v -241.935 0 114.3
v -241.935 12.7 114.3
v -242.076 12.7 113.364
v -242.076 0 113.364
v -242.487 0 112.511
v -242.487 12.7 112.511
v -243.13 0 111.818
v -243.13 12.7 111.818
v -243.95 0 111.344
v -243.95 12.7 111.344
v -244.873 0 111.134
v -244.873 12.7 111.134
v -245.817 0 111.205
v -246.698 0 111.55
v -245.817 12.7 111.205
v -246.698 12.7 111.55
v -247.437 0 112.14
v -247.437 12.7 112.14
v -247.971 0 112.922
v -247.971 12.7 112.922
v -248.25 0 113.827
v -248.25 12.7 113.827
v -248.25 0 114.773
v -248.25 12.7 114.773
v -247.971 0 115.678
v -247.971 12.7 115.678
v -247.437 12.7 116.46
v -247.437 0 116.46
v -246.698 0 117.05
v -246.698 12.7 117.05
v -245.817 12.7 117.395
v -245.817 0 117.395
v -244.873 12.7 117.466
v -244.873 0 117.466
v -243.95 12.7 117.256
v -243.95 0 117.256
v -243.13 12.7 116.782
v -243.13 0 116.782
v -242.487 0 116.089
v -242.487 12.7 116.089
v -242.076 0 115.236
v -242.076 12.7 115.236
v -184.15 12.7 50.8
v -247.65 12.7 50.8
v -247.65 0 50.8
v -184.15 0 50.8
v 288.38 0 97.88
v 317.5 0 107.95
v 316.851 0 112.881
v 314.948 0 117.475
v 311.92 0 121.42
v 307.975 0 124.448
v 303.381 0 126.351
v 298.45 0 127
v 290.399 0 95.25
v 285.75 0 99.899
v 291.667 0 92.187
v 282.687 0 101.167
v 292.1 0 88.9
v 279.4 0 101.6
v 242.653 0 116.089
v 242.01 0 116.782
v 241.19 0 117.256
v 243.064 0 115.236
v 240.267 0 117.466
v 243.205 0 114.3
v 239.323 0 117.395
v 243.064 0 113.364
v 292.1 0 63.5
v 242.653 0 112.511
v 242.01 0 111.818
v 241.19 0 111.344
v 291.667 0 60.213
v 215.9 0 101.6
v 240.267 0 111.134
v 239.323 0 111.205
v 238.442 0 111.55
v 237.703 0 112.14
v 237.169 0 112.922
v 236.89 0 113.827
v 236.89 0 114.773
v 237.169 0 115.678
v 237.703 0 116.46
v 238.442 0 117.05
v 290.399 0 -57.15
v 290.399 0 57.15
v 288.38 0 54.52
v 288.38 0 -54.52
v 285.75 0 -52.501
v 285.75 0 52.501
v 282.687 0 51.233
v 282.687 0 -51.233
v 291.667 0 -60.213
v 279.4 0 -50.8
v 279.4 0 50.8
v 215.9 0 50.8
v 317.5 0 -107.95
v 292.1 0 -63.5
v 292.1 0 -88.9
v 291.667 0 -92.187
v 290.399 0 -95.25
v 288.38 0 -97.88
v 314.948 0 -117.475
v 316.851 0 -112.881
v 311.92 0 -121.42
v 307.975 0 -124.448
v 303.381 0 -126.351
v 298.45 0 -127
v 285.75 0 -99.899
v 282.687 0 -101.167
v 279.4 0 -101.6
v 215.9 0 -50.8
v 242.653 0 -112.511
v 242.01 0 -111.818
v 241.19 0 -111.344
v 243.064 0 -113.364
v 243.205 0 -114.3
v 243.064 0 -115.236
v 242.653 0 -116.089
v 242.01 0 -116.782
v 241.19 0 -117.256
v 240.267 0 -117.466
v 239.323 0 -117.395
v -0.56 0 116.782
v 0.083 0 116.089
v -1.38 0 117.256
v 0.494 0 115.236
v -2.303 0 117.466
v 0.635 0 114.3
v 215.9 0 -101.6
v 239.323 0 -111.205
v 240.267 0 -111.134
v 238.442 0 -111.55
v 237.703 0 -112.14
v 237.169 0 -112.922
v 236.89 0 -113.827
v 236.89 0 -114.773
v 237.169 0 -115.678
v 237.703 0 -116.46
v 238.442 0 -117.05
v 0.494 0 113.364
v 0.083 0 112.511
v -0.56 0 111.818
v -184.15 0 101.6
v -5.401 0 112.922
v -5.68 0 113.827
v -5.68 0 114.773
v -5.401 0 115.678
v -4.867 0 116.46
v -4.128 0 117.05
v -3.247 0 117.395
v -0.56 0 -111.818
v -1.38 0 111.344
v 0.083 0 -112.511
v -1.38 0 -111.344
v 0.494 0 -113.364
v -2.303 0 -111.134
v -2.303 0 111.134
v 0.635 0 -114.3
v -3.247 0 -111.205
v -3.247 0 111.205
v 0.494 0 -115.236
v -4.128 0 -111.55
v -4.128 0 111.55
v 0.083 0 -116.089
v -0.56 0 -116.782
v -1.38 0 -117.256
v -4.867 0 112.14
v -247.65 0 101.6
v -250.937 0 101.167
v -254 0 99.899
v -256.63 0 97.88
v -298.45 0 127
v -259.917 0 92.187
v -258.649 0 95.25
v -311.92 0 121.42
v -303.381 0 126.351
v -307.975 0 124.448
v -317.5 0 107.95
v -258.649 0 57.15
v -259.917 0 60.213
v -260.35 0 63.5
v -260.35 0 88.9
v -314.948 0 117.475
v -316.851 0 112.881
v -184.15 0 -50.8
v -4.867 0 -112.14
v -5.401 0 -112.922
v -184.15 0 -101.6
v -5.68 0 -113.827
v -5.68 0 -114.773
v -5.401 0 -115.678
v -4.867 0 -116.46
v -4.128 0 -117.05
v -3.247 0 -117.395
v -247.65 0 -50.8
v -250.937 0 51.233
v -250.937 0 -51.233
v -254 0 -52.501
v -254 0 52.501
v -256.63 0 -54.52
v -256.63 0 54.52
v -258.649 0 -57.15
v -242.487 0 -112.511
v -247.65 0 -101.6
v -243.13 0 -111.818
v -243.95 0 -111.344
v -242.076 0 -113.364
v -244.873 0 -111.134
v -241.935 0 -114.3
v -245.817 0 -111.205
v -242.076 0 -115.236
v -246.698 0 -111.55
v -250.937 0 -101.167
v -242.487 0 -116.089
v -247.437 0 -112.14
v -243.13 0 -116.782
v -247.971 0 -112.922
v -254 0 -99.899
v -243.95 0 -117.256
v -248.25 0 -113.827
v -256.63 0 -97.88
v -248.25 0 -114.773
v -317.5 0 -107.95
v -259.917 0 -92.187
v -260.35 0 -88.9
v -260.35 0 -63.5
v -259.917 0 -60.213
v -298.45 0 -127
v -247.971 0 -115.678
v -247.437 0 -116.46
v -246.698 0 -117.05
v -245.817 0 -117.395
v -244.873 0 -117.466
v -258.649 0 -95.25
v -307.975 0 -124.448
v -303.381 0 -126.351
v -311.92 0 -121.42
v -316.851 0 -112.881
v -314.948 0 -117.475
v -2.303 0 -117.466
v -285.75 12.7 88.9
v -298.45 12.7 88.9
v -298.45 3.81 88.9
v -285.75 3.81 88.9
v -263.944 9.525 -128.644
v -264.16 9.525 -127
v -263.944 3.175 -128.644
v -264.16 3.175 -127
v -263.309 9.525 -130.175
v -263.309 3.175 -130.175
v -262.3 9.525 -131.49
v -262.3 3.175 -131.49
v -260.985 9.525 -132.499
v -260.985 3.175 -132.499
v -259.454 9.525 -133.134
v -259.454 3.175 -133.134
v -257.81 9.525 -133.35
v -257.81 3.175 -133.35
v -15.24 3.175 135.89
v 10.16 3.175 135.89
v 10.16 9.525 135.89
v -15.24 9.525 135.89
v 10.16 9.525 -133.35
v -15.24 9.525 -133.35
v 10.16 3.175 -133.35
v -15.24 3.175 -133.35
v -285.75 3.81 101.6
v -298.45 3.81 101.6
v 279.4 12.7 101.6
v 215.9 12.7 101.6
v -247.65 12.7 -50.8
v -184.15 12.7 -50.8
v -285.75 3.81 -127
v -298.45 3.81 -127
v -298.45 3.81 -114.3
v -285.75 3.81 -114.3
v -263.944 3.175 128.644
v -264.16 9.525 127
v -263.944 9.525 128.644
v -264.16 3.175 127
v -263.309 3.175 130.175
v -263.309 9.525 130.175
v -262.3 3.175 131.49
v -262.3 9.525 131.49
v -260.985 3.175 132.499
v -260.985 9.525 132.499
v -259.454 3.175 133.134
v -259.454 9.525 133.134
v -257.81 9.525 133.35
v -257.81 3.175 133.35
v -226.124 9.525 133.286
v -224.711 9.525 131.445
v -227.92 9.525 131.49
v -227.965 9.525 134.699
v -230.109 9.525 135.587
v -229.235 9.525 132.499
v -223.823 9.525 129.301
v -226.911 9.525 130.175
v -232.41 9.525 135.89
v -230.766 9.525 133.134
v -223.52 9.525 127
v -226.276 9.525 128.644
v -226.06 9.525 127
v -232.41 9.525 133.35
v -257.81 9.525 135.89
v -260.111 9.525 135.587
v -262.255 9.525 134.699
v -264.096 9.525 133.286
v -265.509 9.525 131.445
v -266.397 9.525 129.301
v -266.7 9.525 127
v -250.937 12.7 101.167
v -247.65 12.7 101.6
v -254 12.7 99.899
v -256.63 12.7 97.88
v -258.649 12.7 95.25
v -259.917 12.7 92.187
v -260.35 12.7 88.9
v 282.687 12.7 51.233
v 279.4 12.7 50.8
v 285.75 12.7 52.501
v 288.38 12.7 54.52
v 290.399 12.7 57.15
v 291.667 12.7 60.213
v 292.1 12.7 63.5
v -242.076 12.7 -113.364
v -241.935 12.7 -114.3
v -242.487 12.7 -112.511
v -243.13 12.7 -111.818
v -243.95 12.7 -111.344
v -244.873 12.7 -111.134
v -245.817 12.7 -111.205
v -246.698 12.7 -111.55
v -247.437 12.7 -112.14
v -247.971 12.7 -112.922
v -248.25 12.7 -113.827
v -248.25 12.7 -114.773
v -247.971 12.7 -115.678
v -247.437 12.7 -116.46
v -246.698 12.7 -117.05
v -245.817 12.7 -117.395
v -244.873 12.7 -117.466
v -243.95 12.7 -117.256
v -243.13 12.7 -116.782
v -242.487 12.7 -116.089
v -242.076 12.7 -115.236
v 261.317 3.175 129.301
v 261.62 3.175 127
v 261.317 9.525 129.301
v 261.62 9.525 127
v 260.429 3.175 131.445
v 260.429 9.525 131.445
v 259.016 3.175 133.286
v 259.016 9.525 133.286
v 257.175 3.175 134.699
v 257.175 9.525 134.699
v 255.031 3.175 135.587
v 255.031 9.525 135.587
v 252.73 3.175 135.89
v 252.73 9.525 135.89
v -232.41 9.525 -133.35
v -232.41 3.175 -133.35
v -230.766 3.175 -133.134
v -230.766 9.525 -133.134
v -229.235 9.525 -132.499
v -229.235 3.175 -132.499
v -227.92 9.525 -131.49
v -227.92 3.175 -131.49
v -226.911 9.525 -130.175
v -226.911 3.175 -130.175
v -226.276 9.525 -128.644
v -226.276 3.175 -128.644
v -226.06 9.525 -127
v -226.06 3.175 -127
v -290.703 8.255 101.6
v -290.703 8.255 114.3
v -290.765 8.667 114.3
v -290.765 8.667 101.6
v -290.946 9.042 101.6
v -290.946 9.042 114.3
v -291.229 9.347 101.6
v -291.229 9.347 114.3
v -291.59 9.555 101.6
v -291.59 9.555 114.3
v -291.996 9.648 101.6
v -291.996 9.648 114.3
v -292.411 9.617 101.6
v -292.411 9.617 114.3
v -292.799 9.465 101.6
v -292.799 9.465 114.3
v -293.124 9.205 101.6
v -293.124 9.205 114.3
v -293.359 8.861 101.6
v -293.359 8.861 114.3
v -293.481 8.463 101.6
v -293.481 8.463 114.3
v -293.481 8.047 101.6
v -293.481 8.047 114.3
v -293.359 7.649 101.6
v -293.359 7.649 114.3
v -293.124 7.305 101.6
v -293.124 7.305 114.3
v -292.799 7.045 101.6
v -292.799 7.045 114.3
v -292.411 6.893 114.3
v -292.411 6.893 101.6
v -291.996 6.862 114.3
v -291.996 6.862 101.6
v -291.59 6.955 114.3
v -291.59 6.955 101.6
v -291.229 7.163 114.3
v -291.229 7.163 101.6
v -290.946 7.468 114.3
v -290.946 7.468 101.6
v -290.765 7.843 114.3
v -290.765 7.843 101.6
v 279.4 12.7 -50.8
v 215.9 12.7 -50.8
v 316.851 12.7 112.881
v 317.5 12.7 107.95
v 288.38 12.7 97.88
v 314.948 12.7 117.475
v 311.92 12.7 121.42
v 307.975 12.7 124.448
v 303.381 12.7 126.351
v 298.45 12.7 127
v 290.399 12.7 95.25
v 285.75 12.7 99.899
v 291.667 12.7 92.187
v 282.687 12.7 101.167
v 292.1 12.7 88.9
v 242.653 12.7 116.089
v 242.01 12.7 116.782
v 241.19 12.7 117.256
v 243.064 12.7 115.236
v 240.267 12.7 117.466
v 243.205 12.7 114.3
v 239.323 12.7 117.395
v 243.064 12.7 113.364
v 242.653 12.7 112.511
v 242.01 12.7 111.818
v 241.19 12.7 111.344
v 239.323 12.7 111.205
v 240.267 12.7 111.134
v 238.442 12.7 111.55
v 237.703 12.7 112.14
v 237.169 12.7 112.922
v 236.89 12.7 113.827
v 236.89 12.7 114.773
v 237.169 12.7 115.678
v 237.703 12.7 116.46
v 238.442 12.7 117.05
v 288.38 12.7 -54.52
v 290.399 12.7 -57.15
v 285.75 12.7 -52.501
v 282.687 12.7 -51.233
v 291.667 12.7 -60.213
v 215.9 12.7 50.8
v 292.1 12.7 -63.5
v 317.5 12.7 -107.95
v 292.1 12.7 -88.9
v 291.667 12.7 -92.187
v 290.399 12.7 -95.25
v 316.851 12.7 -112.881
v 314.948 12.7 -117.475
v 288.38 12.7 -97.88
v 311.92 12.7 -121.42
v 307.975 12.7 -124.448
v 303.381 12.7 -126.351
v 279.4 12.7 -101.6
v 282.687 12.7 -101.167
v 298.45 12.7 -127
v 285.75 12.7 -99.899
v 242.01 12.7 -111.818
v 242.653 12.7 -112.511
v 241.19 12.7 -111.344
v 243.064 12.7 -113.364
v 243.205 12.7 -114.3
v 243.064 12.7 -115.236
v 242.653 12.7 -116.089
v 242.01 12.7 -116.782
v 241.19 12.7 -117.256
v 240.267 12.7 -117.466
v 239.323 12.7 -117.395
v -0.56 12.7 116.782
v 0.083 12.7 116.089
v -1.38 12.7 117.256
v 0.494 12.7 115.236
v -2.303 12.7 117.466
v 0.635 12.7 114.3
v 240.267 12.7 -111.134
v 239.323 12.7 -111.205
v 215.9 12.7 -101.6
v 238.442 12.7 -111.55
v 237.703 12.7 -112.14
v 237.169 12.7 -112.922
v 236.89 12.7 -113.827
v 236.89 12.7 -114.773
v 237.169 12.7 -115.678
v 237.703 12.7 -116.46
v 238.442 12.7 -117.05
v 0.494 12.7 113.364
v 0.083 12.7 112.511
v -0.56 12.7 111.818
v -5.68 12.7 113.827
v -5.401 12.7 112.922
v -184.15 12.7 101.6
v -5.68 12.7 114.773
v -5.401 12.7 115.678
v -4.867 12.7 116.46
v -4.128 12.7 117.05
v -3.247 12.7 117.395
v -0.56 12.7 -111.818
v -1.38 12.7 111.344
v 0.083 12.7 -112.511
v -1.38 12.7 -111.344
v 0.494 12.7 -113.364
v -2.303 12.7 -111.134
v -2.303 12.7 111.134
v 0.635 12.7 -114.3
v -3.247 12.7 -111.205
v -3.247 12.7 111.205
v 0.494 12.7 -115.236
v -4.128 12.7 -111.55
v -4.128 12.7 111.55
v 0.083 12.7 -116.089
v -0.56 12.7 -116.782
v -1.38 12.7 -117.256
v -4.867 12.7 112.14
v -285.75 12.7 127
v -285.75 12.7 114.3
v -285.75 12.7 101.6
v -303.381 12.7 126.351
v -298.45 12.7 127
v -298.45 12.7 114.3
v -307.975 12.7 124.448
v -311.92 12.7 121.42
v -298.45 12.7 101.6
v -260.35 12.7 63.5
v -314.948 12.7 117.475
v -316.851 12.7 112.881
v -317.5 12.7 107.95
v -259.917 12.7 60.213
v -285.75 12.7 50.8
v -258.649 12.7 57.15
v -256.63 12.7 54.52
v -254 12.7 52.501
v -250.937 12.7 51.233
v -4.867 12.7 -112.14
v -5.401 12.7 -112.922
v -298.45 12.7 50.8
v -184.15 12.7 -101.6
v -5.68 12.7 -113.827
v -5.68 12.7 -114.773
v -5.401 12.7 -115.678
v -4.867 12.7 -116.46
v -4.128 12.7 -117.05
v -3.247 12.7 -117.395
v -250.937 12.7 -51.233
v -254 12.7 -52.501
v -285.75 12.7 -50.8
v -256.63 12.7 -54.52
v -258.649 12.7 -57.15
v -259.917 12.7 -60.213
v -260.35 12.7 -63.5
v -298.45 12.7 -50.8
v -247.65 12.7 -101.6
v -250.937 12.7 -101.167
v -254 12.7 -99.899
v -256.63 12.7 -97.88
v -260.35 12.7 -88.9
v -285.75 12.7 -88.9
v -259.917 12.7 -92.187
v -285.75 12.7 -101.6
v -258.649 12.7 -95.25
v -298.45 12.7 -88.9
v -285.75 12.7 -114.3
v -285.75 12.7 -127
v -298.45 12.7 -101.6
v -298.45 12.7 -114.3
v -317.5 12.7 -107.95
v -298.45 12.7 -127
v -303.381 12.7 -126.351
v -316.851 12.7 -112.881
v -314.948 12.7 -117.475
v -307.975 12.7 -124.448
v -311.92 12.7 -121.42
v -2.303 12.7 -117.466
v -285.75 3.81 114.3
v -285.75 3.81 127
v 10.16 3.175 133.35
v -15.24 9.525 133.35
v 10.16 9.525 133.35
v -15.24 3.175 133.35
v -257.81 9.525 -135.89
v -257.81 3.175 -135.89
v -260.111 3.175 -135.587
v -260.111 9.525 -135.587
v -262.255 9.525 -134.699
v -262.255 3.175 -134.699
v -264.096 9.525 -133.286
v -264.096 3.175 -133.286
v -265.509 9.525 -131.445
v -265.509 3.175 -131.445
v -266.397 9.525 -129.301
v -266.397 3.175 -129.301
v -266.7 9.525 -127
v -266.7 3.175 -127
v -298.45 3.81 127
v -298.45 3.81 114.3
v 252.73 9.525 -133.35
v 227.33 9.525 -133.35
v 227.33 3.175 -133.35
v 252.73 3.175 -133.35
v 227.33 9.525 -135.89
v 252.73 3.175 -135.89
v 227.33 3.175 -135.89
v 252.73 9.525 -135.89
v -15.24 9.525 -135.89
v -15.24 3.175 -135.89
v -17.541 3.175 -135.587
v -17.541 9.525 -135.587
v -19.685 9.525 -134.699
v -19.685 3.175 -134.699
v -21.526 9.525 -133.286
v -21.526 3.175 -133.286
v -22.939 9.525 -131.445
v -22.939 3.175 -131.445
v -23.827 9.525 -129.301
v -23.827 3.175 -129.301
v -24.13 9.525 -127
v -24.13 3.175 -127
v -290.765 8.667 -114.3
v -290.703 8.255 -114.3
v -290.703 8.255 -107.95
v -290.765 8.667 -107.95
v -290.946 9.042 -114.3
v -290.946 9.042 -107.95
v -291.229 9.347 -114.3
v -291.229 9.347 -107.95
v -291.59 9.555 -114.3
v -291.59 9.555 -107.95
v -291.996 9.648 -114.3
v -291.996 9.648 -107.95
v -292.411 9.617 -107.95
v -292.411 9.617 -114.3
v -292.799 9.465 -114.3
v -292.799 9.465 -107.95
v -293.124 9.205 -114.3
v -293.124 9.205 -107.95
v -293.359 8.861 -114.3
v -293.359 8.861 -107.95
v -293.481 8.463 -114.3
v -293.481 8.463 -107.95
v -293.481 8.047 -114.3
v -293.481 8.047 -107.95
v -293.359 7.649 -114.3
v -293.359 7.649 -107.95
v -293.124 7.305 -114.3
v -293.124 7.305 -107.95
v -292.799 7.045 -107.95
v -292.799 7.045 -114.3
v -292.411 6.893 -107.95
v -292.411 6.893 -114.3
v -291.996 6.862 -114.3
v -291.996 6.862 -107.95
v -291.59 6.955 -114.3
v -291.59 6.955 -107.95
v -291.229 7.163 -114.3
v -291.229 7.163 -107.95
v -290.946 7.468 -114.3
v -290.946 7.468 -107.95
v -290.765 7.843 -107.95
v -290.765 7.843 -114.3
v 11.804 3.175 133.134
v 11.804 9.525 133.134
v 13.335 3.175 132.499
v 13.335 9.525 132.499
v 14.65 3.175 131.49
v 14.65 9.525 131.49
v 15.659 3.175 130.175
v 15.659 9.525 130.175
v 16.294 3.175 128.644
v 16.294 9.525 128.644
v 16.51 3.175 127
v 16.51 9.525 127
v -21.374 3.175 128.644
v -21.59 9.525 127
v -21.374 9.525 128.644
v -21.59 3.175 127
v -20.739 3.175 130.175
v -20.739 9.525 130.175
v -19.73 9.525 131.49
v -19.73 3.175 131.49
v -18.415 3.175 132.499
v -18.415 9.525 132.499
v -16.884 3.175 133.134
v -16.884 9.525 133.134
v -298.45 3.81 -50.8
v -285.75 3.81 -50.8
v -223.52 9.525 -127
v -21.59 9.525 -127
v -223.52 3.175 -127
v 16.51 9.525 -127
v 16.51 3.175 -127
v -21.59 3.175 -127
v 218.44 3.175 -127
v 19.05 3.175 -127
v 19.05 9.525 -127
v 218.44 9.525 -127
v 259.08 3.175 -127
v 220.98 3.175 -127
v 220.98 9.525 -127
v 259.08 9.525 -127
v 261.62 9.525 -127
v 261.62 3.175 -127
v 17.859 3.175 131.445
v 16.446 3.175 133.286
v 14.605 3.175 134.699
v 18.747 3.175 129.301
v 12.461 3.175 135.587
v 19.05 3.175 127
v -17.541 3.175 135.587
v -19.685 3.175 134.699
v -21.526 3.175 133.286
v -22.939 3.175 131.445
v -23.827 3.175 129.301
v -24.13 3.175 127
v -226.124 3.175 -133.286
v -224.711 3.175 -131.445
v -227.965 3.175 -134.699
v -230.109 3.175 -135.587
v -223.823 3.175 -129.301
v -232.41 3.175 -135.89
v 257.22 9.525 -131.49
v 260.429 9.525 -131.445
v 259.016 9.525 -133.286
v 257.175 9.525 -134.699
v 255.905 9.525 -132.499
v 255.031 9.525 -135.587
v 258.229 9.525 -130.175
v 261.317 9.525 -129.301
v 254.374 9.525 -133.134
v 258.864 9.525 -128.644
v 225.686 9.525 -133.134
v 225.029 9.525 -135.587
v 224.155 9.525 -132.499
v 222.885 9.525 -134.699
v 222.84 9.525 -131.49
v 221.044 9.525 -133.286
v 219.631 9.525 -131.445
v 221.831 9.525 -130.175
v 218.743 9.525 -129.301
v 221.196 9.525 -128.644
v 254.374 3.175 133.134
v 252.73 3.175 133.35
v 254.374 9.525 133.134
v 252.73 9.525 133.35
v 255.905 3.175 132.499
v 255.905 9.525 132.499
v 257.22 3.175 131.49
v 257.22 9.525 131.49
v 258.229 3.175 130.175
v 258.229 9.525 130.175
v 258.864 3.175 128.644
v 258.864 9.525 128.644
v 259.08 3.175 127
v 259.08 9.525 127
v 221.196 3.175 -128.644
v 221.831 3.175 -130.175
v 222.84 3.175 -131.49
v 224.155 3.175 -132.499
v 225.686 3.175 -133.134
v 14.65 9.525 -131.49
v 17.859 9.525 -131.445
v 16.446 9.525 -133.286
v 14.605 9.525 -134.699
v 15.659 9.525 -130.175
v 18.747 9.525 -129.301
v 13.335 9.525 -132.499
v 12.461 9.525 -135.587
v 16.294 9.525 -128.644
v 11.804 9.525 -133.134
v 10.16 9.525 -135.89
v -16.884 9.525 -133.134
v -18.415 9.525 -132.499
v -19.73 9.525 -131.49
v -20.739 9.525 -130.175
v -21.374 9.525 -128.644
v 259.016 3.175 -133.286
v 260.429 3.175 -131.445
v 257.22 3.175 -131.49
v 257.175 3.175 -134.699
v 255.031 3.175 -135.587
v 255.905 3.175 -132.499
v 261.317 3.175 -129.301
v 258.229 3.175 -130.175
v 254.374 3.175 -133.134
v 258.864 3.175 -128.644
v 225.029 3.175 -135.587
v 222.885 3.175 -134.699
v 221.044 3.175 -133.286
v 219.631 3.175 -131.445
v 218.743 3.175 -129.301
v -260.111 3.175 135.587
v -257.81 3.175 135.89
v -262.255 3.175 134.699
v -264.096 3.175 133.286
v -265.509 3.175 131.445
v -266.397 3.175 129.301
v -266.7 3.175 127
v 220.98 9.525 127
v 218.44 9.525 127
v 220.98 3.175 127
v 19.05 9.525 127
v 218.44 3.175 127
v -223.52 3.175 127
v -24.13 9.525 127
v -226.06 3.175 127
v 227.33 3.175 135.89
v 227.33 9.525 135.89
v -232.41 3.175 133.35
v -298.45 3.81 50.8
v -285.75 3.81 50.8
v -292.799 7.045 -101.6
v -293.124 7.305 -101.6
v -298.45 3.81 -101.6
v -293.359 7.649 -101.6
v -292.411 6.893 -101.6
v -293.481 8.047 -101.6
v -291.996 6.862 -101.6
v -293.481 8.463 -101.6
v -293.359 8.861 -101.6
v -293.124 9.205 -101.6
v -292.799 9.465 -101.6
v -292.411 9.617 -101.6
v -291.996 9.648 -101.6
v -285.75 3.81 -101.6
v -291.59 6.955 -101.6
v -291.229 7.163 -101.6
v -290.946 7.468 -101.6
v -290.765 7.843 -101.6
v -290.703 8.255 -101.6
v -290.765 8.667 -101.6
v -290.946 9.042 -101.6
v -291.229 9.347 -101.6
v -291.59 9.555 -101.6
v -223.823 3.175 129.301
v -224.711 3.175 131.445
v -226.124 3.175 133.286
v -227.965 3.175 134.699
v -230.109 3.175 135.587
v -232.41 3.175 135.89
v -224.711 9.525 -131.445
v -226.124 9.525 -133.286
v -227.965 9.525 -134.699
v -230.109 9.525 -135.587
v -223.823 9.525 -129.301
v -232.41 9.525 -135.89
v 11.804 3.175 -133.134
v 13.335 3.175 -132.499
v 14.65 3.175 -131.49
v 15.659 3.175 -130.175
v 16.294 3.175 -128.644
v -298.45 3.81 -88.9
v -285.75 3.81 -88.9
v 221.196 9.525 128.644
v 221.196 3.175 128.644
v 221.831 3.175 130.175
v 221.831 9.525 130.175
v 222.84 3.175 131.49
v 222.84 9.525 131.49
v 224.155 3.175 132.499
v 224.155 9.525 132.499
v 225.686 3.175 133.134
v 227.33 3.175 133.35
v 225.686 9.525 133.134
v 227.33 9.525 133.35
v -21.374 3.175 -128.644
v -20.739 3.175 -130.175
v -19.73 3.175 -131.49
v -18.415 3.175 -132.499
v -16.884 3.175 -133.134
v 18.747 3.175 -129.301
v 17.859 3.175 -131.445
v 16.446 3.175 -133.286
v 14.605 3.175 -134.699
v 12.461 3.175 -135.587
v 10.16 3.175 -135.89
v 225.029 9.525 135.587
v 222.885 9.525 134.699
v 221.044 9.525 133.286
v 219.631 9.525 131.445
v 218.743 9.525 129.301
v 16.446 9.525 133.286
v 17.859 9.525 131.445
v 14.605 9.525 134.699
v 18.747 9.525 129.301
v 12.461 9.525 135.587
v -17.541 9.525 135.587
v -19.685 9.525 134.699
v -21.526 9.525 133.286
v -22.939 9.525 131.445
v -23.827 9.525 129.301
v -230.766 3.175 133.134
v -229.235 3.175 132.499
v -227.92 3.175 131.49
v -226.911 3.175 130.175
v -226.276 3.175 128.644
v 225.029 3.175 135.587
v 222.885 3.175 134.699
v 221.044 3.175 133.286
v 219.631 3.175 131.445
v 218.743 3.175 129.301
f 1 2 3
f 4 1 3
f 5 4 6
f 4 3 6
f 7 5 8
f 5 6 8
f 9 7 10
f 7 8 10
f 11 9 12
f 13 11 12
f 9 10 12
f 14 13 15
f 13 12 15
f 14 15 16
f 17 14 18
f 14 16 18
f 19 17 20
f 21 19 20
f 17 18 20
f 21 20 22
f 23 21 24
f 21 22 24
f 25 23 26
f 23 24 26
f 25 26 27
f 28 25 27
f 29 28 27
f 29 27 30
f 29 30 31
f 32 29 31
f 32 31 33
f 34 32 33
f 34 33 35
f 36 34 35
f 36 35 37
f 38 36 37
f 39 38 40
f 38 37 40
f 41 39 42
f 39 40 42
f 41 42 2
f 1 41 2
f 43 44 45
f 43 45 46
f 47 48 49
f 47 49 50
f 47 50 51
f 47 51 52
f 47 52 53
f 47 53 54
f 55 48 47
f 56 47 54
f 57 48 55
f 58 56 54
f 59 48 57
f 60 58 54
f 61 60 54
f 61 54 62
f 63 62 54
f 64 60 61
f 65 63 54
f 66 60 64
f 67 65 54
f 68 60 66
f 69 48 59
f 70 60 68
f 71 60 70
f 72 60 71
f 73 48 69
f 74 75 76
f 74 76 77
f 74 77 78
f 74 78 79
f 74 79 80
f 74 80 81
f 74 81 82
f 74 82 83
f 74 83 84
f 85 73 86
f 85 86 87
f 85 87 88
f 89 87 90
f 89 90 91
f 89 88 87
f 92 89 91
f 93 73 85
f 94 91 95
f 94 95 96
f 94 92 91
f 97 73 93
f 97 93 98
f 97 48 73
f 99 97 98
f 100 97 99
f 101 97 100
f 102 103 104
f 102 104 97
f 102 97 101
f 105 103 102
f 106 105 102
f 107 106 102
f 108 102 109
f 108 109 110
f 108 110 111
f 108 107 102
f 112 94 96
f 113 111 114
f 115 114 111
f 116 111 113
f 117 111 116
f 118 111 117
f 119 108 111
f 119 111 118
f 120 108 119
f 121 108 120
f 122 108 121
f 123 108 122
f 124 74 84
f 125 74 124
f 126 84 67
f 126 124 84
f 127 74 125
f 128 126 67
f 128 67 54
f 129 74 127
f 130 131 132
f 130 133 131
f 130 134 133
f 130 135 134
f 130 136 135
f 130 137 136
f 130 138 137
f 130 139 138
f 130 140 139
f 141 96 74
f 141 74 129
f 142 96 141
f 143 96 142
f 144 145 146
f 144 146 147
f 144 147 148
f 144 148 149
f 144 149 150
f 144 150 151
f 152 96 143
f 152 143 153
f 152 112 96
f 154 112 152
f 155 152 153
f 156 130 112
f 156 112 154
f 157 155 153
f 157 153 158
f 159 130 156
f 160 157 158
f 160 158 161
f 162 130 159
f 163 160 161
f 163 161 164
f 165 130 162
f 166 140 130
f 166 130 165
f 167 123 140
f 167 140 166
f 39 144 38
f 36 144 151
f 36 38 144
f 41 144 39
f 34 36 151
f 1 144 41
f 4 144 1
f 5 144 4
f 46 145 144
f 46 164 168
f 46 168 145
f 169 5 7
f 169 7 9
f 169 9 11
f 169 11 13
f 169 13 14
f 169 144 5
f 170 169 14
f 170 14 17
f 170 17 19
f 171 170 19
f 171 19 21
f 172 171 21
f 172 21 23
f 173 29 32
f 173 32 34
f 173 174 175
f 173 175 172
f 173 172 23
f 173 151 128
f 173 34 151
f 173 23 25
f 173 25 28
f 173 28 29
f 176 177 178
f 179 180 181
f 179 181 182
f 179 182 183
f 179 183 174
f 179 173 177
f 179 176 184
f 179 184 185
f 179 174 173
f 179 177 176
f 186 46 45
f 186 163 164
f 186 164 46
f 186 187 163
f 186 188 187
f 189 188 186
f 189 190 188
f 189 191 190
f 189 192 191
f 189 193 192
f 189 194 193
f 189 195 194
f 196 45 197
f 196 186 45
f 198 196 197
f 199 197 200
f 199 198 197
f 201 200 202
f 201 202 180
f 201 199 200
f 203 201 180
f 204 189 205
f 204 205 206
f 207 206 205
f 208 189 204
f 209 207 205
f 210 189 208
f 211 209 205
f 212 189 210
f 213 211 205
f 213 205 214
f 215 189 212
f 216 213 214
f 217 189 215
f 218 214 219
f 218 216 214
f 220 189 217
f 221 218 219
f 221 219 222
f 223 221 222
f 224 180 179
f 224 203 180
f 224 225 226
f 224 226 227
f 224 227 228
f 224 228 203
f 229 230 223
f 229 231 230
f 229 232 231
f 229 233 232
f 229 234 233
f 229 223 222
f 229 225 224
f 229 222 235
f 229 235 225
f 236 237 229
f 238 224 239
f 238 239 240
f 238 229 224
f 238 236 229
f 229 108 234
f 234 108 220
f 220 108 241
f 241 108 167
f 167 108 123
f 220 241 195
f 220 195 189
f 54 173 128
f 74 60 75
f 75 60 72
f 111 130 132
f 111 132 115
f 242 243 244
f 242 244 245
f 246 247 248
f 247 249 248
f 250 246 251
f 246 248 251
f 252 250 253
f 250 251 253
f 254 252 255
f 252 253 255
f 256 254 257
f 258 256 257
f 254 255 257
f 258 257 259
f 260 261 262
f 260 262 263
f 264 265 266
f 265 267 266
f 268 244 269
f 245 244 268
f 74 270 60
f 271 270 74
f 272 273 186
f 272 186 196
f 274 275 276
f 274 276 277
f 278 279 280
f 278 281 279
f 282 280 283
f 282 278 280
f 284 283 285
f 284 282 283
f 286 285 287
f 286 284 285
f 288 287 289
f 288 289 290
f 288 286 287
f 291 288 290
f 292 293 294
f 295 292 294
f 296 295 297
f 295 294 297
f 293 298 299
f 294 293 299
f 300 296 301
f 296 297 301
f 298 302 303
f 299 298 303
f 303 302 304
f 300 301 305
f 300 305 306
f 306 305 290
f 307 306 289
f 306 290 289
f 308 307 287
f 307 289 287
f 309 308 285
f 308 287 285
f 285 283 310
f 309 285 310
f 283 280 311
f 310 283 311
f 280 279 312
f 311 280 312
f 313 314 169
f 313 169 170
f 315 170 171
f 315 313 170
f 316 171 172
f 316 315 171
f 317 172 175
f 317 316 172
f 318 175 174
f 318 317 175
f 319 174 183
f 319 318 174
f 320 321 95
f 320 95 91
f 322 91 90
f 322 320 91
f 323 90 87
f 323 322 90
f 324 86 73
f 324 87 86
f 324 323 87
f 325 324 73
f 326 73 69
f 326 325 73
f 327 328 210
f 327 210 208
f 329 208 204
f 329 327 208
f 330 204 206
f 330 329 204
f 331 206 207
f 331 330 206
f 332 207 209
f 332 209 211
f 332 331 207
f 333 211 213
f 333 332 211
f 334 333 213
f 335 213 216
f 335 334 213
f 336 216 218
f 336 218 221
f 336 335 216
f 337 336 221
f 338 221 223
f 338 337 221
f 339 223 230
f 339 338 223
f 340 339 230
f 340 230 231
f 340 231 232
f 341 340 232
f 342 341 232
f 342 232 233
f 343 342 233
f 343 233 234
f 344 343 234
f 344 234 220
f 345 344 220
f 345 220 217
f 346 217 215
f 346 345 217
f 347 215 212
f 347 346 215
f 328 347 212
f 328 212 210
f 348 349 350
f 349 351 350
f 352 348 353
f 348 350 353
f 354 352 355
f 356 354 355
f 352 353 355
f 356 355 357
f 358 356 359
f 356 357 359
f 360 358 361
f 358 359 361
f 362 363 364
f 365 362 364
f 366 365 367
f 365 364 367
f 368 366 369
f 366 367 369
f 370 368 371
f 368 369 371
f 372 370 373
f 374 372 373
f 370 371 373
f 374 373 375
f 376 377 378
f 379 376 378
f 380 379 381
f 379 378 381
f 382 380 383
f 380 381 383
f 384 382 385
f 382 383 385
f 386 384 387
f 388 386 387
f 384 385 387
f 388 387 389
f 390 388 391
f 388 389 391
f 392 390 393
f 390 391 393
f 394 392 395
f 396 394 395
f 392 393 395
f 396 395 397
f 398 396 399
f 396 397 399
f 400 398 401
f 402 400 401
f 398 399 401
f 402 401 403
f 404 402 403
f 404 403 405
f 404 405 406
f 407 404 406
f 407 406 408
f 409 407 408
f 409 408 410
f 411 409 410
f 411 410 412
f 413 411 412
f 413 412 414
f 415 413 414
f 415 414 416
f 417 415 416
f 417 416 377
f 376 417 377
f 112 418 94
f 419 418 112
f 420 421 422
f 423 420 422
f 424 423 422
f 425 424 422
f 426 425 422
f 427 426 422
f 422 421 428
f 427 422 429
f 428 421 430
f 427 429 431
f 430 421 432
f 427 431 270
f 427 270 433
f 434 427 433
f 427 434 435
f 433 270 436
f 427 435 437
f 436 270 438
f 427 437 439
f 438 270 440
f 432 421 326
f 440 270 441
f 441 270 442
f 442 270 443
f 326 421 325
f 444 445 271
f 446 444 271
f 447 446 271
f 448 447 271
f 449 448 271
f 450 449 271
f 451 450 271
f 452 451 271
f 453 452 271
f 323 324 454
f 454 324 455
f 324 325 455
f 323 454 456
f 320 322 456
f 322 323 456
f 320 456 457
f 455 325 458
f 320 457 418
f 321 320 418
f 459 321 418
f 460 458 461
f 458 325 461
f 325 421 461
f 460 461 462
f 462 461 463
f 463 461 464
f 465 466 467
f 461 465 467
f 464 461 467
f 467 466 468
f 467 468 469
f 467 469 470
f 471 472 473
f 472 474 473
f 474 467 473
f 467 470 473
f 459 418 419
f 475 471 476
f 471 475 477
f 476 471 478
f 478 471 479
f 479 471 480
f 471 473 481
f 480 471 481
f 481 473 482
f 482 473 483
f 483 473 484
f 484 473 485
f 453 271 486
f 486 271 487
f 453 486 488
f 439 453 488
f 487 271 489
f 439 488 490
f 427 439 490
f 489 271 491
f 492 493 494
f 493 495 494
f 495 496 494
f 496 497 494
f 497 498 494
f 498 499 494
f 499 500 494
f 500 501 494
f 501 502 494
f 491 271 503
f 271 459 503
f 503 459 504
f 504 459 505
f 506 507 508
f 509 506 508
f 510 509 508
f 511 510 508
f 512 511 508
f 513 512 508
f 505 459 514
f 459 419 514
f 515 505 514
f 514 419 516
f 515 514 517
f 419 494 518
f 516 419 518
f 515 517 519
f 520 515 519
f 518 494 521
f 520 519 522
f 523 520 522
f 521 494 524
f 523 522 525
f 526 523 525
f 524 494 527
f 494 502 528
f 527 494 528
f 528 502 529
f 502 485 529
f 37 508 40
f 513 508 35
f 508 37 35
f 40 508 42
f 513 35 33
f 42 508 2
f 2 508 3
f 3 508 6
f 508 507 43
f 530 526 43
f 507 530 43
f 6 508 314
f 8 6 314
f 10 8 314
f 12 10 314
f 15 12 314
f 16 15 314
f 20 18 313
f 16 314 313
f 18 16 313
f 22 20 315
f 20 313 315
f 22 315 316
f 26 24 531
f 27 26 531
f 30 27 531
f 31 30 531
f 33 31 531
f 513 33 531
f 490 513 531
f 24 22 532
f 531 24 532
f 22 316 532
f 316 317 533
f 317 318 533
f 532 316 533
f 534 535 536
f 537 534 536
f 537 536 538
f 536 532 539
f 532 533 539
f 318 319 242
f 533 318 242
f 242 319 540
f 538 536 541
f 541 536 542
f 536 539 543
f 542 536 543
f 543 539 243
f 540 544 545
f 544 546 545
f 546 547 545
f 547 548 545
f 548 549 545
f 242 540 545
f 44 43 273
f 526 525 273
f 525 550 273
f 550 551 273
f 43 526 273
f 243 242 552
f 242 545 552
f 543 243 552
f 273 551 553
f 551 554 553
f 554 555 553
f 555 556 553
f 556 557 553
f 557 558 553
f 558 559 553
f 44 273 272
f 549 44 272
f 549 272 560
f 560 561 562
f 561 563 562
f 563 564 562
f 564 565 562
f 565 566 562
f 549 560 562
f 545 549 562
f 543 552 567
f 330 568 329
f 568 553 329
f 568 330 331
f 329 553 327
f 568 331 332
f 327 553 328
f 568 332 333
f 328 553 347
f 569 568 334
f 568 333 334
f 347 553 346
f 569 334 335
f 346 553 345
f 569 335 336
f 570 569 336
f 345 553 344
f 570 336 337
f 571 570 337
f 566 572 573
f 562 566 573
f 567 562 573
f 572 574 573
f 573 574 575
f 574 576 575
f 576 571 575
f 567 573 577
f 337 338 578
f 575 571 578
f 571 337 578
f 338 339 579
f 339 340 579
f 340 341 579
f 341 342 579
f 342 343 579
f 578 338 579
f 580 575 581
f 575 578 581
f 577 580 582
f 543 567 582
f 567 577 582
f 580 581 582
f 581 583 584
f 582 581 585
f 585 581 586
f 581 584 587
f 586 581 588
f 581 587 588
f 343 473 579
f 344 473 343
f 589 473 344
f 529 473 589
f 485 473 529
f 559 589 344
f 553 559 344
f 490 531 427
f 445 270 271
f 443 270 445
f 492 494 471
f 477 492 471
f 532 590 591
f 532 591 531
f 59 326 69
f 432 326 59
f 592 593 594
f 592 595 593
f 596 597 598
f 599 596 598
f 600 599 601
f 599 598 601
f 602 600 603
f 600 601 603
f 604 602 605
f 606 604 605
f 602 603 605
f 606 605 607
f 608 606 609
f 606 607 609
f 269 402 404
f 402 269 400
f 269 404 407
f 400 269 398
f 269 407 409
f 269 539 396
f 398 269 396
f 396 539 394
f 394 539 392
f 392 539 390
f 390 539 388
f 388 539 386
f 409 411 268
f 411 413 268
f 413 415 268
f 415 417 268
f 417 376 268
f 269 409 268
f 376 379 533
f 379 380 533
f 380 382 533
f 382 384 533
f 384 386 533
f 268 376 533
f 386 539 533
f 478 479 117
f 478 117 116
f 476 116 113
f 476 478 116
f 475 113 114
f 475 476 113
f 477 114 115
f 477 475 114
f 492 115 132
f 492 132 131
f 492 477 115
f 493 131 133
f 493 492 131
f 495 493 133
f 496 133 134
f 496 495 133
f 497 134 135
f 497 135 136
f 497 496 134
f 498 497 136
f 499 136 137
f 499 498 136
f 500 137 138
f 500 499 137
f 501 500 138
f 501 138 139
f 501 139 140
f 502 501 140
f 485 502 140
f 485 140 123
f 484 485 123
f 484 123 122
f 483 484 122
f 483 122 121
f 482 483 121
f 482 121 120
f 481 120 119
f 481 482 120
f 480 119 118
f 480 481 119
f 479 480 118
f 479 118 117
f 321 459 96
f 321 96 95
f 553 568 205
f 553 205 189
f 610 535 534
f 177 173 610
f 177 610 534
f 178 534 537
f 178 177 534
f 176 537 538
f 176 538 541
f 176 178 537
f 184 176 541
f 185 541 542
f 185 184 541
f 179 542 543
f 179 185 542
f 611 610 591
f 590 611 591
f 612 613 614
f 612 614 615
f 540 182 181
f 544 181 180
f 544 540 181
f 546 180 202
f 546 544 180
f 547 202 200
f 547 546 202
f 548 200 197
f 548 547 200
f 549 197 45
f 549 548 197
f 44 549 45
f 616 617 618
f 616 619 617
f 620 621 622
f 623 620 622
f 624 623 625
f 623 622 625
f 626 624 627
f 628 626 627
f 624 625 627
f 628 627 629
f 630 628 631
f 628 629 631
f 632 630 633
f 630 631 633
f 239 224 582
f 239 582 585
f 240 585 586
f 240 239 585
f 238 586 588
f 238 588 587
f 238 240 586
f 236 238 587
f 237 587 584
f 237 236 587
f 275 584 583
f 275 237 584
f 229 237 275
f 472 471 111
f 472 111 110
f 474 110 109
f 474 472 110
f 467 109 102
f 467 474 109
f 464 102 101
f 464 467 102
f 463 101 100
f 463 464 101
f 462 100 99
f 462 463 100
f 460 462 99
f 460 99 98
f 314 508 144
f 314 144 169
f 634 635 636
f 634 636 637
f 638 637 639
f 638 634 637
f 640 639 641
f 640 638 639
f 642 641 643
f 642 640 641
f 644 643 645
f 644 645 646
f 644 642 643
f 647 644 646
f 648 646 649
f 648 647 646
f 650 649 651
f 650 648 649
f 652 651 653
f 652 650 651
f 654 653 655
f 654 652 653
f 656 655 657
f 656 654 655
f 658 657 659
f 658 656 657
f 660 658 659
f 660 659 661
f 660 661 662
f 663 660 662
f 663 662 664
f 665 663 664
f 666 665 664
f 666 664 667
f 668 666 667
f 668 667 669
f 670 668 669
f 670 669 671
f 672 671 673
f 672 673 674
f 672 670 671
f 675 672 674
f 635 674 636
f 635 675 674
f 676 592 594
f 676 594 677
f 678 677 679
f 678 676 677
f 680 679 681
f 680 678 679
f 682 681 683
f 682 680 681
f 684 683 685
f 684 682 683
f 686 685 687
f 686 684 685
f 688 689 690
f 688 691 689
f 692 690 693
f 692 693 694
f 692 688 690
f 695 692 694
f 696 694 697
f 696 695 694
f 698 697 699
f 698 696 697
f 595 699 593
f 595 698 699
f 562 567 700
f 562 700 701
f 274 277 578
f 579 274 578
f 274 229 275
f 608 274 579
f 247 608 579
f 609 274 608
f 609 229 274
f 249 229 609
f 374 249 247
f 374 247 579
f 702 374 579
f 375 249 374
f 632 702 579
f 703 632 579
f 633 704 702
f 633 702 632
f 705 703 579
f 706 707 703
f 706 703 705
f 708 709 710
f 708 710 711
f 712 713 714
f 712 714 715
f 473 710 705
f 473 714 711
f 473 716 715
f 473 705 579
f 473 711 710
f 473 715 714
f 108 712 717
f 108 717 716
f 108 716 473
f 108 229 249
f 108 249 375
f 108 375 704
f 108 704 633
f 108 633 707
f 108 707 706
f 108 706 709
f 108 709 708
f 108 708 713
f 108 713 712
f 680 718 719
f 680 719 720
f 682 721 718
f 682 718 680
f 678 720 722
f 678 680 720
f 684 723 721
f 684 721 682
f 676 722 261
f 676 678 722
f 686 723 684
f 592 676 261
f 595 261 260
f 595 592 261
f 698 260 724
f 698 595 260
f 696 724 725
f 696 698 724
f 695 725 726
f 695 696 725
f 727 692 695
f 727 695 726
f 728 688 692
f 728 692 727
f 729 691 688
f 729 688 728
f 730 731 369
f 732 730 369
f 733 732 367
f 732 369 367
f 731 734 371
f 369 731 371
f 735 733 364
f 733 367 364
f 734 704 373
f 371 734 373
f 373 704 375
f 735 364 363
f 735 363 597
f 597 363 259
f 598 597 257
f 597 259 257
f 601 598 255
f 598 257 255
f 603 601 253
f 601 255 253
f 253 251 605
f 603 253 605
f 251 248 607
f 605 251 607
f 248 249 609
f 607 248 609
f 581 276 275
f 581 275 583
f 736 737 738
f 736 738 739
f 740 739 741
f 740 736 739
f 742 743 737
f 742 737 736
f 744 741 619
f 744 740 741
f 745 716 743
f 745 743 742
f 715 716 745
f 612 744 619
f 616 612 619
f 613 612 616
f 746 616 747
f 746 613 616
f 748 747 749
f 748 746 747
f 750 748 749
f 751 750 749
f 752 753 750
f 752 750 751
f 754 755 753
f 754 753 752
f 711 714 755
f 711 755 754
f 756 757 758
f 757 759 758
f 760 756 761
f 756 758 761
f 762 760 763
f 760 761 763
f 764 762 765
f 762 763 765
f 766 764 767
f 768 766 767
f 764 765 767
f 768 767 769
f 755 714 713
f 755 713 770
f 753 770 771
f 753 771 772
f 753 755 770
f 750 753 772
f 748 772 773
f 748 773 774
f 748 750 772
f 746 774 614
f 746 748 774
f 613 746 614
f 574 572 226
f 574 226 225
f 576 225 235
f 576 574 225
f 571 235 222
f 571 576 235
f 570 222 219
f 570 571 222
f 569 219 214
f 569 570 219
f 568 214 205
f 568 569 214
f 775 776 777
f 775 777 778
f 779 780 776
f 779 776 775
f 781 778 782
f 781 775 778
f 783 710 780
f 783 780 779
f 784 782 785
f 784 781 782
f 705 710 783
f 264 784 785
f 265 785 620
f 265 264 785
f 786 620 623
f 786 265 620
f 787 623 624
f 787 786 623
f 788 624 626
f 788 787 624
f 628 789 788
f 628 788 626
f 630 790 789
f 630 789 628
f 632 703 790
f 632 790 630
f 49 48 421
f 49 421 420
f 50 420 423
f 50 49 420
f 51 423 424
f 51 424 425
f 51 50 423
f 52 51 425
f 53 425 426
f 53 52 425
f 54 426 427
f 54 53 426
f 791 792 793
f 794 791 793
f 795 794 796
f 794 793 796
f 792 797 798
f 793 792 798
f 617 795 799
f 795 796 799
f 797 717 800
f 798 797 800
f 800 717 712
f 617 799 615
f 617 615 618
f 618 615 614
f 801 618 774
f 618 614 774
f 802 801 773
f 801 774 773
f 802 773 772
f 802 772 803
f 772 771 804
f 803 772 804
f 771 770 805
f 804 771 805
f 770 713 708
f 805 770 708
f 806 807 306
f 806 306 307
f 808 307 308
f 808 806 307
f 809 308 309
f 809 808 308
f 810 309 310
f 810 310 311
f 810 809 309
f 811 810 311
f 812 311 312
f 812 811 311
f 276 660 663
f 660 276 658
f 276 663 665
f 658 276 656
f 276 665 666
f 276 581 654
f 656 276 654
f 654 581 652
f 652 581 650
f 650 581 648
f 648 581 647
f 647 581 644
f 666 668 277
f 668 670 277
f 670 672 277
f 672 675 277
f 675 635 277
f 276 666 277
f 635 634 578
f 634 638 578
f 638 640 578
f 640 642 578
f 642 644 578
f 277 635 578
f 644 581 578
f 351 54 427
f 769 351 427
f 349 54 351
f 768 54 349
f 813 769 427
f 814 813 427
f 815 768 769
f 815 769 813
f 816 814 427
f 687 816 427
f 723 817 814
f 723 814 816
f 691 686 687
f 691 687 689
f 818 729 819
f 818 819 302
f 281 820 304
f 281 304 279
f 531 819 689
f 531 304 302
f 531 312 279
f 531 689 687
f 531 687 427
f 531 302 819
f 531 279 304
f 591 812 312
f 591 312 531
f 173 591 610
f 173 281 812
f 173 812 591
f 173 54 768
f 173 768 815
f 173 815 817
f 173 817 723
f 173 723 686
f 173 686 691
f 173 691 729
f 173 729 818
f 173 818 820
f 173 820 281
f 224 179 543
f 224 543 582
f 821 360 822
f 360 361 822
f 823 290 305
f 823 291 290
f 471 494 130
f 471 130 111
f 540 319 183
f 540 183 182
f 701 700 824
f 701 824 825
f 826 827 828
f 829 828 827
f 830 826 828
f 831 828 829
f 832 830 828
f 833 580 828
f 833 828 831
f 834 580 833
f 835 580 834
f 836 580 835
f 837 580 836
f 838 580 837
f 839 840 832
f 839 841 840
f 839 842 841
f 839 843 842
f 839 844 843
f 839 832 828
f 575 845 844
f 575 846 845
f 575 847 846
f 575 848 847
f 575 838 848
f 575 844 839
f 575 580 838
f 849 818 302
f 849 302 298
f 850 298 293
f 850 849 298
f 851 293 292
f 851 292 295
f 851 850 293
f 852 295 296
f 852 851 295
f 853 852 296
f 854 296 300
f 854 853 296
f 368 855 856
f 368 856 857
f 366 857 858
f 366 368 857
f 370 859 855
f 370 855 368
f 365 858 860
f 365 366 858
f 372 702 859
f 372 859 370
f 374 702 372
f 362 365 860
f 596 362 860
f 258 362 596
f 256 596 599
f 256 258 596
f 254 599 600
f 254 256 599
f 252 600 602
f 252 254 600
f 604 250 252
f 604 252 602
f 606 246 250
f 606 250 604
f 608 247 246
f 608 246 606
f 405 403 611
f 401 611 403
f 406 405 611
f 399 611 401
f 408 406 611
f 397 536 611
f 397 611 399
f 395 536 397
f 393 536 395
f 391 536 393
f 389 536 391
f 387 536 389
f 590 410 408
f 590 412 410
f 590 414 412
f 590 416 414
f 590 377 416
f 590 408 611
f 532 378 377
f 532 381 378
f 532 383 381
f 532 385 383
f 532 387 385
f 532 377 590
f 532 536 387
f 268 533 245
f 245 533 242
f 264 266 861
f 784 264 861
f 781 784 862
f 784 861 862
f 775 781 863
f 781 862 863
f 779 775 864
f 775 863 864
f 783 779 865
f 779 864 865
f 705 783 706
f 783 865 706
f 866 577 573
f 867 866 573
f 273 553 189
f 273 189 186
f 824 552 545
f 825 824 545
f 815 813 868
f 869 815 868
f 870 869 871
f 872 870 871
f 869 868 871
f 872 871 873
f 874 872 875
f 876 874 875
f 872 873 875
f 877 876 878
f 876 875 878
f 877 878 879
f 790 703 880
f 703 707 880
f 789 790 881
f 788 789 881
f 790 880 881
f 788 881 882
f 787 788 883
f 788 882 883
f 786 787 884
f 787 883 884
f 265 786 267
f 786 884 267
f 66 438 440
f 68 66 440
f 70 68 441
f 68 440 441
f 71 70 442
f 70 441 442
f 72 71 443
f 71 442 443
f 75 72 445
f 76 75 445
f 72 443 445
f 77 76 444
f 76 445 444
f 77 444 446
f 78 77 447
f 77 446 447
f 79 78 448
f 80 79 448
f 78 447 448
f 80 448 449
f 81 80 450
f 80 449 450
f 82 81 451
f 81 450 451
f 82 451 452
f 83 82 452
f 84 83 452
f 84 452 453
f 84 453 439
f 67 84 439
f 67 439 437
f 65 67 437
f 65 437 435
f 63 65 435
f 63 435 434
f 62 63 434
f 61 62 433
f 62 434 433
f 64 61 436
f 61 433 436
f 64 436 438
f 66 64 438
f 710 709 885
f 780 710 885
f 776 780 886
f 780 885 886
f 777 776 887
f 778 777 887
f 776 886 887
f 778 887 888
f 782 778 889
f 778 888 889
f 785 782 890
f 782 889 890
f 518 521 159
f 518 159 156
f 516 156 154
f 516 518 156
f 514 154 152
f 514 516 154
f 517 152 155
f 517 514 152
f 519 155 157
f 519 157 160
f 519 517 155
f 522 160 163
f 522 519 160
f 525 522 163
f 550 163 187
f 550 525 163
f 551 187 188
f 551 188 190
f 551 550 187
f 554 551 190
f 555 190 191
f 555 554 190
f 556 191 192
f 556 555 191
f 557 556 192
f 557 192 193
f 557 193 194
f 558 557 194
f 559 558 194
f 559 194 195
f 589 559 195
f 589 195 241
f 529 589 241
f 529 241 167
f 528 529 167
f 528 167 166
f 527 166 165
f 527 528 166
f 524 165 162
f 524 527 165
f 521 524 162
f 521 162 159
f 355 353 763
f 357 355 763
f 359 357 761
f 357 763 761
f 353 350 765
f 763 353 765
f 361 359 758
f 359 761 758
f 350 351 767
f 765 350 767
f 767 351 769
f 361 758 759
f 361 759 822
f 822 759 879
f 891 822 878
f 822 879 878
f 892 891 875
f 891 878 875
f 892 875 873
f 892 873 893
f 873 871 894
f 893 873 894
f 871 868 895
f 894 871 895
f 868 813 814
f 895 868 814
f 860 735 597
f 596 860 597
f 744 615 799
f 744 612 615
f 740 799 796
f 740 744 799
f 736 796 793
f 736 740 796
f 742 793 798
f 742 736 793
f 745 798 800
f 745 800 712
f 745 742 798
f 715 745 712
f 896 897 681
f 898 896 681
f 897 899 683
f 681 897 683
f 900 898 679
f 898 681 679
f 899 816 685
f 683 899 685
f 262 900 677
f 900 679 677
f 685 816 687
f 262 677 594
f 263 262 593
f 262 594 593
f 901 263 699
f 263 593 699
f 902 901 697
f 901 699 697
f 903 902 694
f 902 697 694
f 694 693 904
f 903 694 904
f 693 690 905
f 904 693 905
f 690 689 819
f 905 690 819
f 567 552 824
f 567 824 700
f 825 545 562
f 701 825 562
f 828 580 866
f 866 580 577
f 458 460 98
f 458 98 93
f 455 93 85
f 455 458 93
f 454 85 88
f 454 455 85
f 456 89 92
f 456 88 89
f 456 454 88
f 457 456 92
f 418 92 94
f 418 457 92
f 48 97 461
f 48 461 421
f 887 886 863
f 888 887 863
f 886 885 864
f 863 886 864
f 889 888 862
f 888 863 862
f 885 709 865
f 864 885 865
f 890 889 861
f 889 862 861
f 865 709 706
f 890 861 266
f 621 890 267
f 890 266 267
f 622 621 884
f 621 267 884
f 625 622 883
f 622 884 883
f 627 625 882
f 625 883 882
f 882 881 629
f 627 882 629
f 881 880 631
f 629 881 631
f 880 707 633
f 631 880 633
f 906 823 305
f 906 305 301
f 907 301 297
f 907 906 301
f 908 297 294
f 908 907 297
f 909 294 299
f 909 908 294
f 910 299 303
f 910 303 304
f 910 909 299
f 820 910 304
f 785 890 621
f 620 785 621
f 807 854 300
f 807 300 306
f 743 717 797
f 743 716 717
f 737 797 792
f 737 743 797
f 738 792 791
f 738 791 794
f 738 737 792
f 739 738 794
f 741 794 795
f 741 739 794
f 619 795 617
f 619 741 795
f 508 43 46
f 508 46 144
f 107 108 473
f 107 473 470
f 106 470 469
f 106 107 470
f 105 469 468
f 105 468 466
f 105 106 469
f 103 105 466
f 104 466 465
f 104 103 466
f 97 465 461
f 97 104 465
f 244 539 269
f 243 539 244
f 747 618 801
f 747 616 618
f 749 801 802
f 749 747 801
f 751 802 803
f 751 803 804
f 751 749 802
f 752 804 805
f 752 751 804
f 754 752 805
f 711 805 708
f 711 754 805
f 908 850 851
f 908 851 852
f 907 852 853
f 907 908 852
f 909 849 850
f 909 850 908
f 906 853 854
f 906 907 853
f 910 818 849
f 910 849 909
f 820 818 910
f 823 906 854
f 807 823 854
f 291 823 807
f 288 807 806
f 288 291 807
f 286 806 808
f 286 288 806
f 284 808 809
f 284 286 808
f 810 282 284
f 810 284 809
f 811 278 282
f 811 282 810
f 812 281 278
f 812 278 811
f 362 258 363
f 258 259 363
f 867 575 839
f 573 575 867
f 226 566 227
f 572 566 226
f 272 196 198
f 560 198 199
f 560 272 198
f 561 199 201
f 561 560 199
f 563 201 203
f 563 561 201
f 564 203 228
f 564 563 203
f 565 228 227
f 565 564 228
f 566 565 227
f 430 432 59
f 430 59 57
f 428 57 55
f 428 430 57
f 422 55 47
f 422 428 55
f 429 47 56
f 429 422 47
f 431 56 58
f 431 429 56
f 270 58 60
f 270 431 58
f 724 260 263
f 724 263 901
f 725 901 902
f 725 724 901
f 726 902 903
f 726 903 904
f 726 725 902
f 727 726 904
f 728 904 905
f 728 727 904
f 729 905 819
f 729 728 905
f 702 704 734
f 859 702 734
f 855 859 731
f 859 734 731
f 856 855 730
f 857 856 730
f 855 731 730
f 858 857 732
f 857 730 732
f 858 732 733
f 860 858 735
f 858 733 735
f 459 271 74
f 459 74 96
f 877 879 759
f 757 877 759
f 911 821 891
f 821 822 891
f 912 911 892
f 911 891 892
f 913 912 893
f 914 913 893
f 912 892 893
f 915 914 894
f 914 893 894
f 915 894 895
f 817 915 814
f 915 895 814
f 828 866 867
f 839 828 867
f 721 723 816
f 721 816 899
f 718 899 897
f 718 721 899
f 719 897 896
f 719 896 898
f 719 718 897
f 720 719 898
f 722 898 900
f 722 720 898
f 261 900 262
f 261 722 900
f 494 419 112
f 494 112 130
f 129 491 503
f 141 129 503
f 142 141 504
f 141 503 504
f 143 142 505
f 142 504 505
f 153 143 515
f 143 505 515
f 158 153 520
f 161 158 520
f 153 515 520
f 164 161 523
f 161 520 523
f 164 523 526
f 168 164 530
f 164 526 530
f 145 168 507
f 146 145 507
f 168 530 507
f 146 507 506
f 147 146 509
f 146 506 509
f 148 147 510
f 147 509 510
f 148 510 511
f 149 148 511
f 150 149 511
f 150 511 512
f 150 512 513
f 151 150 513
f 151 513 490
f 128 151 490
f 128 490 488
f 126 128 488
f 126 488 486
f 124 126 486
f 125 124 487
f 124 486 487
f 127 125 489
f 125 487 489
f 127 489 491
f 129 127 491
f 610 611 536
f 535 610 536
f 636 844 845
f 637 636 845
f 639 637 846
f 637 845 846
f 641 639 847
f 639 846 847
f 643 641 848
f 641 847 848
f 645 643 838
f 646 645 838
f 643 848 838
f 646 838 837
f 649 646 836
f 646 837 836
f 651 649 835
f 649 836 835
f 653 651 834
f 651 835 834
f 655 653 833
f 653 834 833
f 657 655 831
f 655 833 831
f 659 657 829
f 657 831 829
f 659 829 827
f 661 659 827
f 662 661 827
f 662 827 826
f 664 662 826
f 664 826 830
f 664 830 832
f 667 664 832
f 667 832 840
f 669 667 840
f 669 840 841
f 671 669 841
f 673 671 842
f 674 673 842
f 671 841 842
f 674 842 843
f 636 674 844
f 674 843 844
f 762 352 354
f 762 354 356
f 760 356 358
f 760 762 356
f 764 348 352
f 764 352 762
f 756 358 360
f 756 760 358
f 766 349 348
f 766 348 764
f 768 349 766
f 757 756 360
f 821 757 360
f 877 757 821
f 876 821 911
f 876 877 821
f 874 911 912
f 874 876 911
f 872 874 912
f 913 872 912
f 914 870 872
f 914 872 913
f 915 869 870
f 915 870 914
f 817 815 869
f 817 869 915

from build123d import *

# Parameters (mm, degrees)
BOSS_EXTRUDE1_DEPTH     = 12.7
BACKREST_BRACKET_SLOT_W = 12.7
BACKREST_BRACKET_SLOT_H = 8.89
CUT_EXTRUDE3_DEPTH      = 12.7
BACKREST_SCREW_HOLE_R   = 1.397
CUT_EXTRUDE4_DEPTH      = 6.35
CUT_EXTRUDE5_DEPTH      = 25.4
BOSS_EXTRUDE2_DEPTH     = 3.175
SKETCH37_W              = 12.7
SKETCH37_H              = 101.6
CUT_EXTRUDE7_DEPTH      = 8.89
SKETCH38_R              = 3.175
CUT_EXTRUDE8_DEPTH      = 12.7
SKETCH39_W              = 12.7
SKETCH39_H              = 12.7
CUT_EXTRUDE9_DEPTH      = 8.89
CUT_EXTRUDE10_START     = -12.7
SKETCH40_R              = 1.397
CUT_EXTRUDE10_DEPTH     = 6.35


with BuildPart() as part:
    # Main Body → Boss-Extrude1 (new body)
    with BuildSketch(Plane(origin=(0, 0, 0), x_dir=(1, 0, 0), z_dir=(0, 1, 0))):
        with BuildLine():
            Line((-317.5, -107.95), (-317.5, 107.95))
            ThreePointArc((-317.5, 107.95), (-311.920384182, 121.420384182), (-298.45, 127))
            Line((-298.45, 127), (298.45, 127))
            ThreePointArc((298.45, 127), (311.920384182, 121.420384182), (317.5, 107.95))
            Line((317.5, 107.95), (317.5, -107.95))
            ThreePointArc((317.5, -107.95), (311.920384182, -121.420384182), (298.45, -127))
            Line((298.45, -127), (-298.45, -127))
            ThreePointArc((-298.45, -127), (-311.920384182, -121.420384182), (-317.5, -107.95))
        make_face()
    extrude(amount=BOSS_EXTRUDE1_DEPTH)

    # Backrest Bracket Slot → Cut-Extrude3 (cut)
    with BuildSketch(Plane.XY.offset(127)):
        with Locations((-292.1, 8.255)):
            Rectangle(BACKREST_BRACKET_SLOT_W, BACKREST_BRACKET_SLOT_H)
    cut_extrude3 = extrude(amount=-CUT_EXTRUDE3_DEPTH, mode=Mode.SUBTRACT)

    # Backrest Screw Hole → Cut-Extrude4 (cut)
    with BuildSketch(Plane.XY.offset(114.3)):
        with Locations((-292.1, 8.255)):
            Circle(BACKREST_SCREW_HOLE_R)
    cut_extrude4 = extrude(amount=-CUT_EXTRUDE4_DEPTH, mode=Mode.SUBTRACT)

    # Mirror1: Cut-Extrude3, Cut-Extrude4 across plane
    add(cut_extrude3.mirror(Plane.XY), mode=Mode.SUBTRACT)
    add(cut_extrude4.mirror(Plane.XY), mode=Mode.SUBTRACT)

    # Couch Foot Slits → Cut-Extrude5 (cut)
    with BuildSketch(Plane(origin=(0, 12.7, 0), x_dir=(1, 0, 0), z_dir=(0, 1, 0))):
        with BuildLine():
            Line((-247.65, 101.6), (-184.15, 101.6))
            Line((-184.15, 101.6), (-184.15, 50.8))
            Line((-184.15, 50.8), (-247.65, 50.8))
            ThreePointArc((-247.65, 50.8), (-256.630256121, 54.519743879), (-260.35, 63.5))
            Line((-260.35, 63.5), (-260.35, 88.9))
            ThreePointArc((-260.35, 88.9), (-256.630256121, 97.880256121), (-247.65, 101.6))
        make_face()
        with BuildLine():
            Line((292.1, 88.9), (292.1, 63.5))
            ThreePointArc((292.1, 63.5), (288.380256121, 54.519743879), (279.4, 50.8))
            Line((279.4, 50.8), (215.9, 50.8))
            Line((215.9, 50.8), (215.9, 101.6))
            Line((215.9, 101.6), (279.4, 101.6))
            ThreePointArc((279.4, 101.6), (288.380256121, 97.880256121), (292.1, 88.9))
        make_face()
        with BuildLine():
            Line((-247.65, -50.8), (-184.15, -50.8))
            Line((-184.15, -50.8), (-184.15, -101.6))
            Line((-184.15, -101.6), (-247.65, -101.6))
            ThreePointArc((-247.65, -101.6), (-256.630256121, -97.880256121), (-260.35, -88.9))
            Line((-260.35, -88.9), (-260.35, -63.5))
            ThreePointArc((-260.35, -63.5), (-256.630256121, -54.519743879), (-247.65, -50.8))
        make_face()
        with BuildLine():
            Line((292.1, -63.5), (292.1, -88.9))
            ThreePointArc((292.1, -88.9), (288.380256121, -97.880256121), (279.4, -101.6))
            Line((279.4, -101.6), (215.9, -101.6))
            Line((215.9, -101.6), (215.9, -50.8))
            Line((215.9, -50.8), (279.4, -50.8))
            ThreePointArc((279.4, -50.8), (288.380256121, -54.519743879), (292.1, -63.5))
        make_face()
    extrude(amount=-CUT_EXTRUDE5_DEPTH, mode=Mode.SUBTRACT)

    # Sketch24 → Boss-Extrude2 (add, symmetric)
    with BuildSketch(Plane(origin=(0, 6.35, 0), x_dir=(1, 0, 0), z_dir=(0, 1, 0))):
        with BuildLine():
            Line((-15.24, -133.35), (10.16, -133.35))
            ThreePointArc((10.16, -133.35), (14.650128061, -131.490128061), (16.51, -127))
            Line((16.51, -127), (19.05, -127))
            ThreePointArc((19.05, -127), (16.446179285, -133.286179285), (10.16, -135.89))
            Line((10.16, -135.89), (-15.24, -135.89))
            ThreePointArc((-15.24, -135.89), (-21.526179285, -133.286179285), (-24.13, -127))
            Line((-24.13, -127), (-21.59, -127))
            ThreePointArc((-21.59, -127), (-19.730128061, -131.490128061), (-15.24, -133.35))
        make_face()
        with BuildLine():
            Line((-257.81, -133.35), (-232.41, -133.35))
            ThreePointArc((-232.41, -133.35), (-227.919871939, -131.490128061), (-226.06, -127))
            Line((-226.06, -127), (-223.52, -127))
            ThreePointArc((-223.52, -127), (-226.123820715, -133.286179285), (-232.41, -135.89))
            Line((-232.41, -135.89), (-257.81, -135.89))
            ThreePointArc((-257.81, -135.89), (-264.096179285, -133.286179285), (-266.7, -127))
            Line((-266.7, -127), (-264.16, -127))
            ThreePointArc((-264.16, -127), (-262.300128061, -131.490128061), (-257.81, -133.35))
        make_face()
        with BuildLine():
            Line((227.33, -133.35), (252.73, -133.35))
            ThreePointArc((252.73, -133.35), (257.220128061, -131.490128061), (259.08, -127))
            Line((259.08, -127), (261.62, -127))
            ThreePointArc((261.62, -127), (259.016179285, -133.286179285), (252.73, -135.89))
            Line((252.73, -135.89), (227.33, -135.89))
            ThreePointArc((227.33, -135.89), (221.043820715, -133.286179285), (218.44, -127))
            Line((218.44, -127), (220.98, -127))
            ThreePointArc((220.98, -127), (222.839871939, -131.490128061), (227.33, -133.35))
        make_face()
    boss_extrude2 = extrude(amount=BOSS_EXTRUDE2_DEPTH, both=True)

    # Mirror2: Boss-Extrude2 across plane
    add(boss_extrude2.mirror(Plane.XY))

    # Sketch37 → Cut-Extrude7 (cut)
    with BuildSketch(Plane(origin=(0, 12.7, 0), x_dir=(1, 0, 0), z_dir=(0, 1, 0))):
        with Locations((-292.1, 0)):
            Rectangle(SKETCH37_W, SKETCH37_H)
    extrude(amount=-CUT_EXTRUDE7_DEPTH, mode=Mode.SUBTRACT)

    # Sketch38 → Cut-Extrude8 (cut)
    with BuildSketch(Plane(origin=(0, 12.7, 0), x_dir=(1, 0, 0), z_dir=(0, 1, 0))):
        with Locations((-245.11, -114.3)):
            Circle(SKETCH38_R)
        with Locations((-2.54, -114.3)):
            Circle(SKETCH38_R)
        with Locations((240.03, -114.3)):
            Circle(SKETCH38_R)
    cut_extrude8 = extrude(amount=-CUT_EXTRUDE8_DEPTH, mode=Mode.SUBTRACT)

    # Mirror3: Cut-Extrude8 across plane
    add(cut_extrude8.mirror(Plane.XY), mode=Mode.SUBTRACT)

    # Sketch39 → Cut-Extrude9 (cut)
    with BuildSketch(Plane(origin=(0, 12.7, 0), x_dir=(1, 0, 0), z_dir=(0, 1, 0))):
        with Locations((-292.1, -95.25)):
            Rectangle(SKETCH39_W, SKETCH39_H)
    cut_extrude9 = extrude(amount=-CUT_EXTRUDE9_DEPTH, mode=Mode.SUBTRACT)

    # Sketch40 → Cut-Extrude10 (cut)
    with BuildSketch(Plane.XY.offset(114.3).offset(CUT_EXTRUDE10_START)):
        with Locations((-292.1, 8.255)):
            Circle(SKETCH40_R)
    cut_extrude10 = extrude(amount=CUT_EXTRUDE10_DEPTH, mode=Mode.SUBTRACT)

    # Mirror5: Cut-Extrude9, Cut-Extrude10 across plane
    add(cut_extrude9.mirror(Plane.XY), mode=Mode.SUBTRACT)
    add(cut_extrude10.mirror(Plane.XY), mode=Mode.SUBTRACT)


solid = part.part
